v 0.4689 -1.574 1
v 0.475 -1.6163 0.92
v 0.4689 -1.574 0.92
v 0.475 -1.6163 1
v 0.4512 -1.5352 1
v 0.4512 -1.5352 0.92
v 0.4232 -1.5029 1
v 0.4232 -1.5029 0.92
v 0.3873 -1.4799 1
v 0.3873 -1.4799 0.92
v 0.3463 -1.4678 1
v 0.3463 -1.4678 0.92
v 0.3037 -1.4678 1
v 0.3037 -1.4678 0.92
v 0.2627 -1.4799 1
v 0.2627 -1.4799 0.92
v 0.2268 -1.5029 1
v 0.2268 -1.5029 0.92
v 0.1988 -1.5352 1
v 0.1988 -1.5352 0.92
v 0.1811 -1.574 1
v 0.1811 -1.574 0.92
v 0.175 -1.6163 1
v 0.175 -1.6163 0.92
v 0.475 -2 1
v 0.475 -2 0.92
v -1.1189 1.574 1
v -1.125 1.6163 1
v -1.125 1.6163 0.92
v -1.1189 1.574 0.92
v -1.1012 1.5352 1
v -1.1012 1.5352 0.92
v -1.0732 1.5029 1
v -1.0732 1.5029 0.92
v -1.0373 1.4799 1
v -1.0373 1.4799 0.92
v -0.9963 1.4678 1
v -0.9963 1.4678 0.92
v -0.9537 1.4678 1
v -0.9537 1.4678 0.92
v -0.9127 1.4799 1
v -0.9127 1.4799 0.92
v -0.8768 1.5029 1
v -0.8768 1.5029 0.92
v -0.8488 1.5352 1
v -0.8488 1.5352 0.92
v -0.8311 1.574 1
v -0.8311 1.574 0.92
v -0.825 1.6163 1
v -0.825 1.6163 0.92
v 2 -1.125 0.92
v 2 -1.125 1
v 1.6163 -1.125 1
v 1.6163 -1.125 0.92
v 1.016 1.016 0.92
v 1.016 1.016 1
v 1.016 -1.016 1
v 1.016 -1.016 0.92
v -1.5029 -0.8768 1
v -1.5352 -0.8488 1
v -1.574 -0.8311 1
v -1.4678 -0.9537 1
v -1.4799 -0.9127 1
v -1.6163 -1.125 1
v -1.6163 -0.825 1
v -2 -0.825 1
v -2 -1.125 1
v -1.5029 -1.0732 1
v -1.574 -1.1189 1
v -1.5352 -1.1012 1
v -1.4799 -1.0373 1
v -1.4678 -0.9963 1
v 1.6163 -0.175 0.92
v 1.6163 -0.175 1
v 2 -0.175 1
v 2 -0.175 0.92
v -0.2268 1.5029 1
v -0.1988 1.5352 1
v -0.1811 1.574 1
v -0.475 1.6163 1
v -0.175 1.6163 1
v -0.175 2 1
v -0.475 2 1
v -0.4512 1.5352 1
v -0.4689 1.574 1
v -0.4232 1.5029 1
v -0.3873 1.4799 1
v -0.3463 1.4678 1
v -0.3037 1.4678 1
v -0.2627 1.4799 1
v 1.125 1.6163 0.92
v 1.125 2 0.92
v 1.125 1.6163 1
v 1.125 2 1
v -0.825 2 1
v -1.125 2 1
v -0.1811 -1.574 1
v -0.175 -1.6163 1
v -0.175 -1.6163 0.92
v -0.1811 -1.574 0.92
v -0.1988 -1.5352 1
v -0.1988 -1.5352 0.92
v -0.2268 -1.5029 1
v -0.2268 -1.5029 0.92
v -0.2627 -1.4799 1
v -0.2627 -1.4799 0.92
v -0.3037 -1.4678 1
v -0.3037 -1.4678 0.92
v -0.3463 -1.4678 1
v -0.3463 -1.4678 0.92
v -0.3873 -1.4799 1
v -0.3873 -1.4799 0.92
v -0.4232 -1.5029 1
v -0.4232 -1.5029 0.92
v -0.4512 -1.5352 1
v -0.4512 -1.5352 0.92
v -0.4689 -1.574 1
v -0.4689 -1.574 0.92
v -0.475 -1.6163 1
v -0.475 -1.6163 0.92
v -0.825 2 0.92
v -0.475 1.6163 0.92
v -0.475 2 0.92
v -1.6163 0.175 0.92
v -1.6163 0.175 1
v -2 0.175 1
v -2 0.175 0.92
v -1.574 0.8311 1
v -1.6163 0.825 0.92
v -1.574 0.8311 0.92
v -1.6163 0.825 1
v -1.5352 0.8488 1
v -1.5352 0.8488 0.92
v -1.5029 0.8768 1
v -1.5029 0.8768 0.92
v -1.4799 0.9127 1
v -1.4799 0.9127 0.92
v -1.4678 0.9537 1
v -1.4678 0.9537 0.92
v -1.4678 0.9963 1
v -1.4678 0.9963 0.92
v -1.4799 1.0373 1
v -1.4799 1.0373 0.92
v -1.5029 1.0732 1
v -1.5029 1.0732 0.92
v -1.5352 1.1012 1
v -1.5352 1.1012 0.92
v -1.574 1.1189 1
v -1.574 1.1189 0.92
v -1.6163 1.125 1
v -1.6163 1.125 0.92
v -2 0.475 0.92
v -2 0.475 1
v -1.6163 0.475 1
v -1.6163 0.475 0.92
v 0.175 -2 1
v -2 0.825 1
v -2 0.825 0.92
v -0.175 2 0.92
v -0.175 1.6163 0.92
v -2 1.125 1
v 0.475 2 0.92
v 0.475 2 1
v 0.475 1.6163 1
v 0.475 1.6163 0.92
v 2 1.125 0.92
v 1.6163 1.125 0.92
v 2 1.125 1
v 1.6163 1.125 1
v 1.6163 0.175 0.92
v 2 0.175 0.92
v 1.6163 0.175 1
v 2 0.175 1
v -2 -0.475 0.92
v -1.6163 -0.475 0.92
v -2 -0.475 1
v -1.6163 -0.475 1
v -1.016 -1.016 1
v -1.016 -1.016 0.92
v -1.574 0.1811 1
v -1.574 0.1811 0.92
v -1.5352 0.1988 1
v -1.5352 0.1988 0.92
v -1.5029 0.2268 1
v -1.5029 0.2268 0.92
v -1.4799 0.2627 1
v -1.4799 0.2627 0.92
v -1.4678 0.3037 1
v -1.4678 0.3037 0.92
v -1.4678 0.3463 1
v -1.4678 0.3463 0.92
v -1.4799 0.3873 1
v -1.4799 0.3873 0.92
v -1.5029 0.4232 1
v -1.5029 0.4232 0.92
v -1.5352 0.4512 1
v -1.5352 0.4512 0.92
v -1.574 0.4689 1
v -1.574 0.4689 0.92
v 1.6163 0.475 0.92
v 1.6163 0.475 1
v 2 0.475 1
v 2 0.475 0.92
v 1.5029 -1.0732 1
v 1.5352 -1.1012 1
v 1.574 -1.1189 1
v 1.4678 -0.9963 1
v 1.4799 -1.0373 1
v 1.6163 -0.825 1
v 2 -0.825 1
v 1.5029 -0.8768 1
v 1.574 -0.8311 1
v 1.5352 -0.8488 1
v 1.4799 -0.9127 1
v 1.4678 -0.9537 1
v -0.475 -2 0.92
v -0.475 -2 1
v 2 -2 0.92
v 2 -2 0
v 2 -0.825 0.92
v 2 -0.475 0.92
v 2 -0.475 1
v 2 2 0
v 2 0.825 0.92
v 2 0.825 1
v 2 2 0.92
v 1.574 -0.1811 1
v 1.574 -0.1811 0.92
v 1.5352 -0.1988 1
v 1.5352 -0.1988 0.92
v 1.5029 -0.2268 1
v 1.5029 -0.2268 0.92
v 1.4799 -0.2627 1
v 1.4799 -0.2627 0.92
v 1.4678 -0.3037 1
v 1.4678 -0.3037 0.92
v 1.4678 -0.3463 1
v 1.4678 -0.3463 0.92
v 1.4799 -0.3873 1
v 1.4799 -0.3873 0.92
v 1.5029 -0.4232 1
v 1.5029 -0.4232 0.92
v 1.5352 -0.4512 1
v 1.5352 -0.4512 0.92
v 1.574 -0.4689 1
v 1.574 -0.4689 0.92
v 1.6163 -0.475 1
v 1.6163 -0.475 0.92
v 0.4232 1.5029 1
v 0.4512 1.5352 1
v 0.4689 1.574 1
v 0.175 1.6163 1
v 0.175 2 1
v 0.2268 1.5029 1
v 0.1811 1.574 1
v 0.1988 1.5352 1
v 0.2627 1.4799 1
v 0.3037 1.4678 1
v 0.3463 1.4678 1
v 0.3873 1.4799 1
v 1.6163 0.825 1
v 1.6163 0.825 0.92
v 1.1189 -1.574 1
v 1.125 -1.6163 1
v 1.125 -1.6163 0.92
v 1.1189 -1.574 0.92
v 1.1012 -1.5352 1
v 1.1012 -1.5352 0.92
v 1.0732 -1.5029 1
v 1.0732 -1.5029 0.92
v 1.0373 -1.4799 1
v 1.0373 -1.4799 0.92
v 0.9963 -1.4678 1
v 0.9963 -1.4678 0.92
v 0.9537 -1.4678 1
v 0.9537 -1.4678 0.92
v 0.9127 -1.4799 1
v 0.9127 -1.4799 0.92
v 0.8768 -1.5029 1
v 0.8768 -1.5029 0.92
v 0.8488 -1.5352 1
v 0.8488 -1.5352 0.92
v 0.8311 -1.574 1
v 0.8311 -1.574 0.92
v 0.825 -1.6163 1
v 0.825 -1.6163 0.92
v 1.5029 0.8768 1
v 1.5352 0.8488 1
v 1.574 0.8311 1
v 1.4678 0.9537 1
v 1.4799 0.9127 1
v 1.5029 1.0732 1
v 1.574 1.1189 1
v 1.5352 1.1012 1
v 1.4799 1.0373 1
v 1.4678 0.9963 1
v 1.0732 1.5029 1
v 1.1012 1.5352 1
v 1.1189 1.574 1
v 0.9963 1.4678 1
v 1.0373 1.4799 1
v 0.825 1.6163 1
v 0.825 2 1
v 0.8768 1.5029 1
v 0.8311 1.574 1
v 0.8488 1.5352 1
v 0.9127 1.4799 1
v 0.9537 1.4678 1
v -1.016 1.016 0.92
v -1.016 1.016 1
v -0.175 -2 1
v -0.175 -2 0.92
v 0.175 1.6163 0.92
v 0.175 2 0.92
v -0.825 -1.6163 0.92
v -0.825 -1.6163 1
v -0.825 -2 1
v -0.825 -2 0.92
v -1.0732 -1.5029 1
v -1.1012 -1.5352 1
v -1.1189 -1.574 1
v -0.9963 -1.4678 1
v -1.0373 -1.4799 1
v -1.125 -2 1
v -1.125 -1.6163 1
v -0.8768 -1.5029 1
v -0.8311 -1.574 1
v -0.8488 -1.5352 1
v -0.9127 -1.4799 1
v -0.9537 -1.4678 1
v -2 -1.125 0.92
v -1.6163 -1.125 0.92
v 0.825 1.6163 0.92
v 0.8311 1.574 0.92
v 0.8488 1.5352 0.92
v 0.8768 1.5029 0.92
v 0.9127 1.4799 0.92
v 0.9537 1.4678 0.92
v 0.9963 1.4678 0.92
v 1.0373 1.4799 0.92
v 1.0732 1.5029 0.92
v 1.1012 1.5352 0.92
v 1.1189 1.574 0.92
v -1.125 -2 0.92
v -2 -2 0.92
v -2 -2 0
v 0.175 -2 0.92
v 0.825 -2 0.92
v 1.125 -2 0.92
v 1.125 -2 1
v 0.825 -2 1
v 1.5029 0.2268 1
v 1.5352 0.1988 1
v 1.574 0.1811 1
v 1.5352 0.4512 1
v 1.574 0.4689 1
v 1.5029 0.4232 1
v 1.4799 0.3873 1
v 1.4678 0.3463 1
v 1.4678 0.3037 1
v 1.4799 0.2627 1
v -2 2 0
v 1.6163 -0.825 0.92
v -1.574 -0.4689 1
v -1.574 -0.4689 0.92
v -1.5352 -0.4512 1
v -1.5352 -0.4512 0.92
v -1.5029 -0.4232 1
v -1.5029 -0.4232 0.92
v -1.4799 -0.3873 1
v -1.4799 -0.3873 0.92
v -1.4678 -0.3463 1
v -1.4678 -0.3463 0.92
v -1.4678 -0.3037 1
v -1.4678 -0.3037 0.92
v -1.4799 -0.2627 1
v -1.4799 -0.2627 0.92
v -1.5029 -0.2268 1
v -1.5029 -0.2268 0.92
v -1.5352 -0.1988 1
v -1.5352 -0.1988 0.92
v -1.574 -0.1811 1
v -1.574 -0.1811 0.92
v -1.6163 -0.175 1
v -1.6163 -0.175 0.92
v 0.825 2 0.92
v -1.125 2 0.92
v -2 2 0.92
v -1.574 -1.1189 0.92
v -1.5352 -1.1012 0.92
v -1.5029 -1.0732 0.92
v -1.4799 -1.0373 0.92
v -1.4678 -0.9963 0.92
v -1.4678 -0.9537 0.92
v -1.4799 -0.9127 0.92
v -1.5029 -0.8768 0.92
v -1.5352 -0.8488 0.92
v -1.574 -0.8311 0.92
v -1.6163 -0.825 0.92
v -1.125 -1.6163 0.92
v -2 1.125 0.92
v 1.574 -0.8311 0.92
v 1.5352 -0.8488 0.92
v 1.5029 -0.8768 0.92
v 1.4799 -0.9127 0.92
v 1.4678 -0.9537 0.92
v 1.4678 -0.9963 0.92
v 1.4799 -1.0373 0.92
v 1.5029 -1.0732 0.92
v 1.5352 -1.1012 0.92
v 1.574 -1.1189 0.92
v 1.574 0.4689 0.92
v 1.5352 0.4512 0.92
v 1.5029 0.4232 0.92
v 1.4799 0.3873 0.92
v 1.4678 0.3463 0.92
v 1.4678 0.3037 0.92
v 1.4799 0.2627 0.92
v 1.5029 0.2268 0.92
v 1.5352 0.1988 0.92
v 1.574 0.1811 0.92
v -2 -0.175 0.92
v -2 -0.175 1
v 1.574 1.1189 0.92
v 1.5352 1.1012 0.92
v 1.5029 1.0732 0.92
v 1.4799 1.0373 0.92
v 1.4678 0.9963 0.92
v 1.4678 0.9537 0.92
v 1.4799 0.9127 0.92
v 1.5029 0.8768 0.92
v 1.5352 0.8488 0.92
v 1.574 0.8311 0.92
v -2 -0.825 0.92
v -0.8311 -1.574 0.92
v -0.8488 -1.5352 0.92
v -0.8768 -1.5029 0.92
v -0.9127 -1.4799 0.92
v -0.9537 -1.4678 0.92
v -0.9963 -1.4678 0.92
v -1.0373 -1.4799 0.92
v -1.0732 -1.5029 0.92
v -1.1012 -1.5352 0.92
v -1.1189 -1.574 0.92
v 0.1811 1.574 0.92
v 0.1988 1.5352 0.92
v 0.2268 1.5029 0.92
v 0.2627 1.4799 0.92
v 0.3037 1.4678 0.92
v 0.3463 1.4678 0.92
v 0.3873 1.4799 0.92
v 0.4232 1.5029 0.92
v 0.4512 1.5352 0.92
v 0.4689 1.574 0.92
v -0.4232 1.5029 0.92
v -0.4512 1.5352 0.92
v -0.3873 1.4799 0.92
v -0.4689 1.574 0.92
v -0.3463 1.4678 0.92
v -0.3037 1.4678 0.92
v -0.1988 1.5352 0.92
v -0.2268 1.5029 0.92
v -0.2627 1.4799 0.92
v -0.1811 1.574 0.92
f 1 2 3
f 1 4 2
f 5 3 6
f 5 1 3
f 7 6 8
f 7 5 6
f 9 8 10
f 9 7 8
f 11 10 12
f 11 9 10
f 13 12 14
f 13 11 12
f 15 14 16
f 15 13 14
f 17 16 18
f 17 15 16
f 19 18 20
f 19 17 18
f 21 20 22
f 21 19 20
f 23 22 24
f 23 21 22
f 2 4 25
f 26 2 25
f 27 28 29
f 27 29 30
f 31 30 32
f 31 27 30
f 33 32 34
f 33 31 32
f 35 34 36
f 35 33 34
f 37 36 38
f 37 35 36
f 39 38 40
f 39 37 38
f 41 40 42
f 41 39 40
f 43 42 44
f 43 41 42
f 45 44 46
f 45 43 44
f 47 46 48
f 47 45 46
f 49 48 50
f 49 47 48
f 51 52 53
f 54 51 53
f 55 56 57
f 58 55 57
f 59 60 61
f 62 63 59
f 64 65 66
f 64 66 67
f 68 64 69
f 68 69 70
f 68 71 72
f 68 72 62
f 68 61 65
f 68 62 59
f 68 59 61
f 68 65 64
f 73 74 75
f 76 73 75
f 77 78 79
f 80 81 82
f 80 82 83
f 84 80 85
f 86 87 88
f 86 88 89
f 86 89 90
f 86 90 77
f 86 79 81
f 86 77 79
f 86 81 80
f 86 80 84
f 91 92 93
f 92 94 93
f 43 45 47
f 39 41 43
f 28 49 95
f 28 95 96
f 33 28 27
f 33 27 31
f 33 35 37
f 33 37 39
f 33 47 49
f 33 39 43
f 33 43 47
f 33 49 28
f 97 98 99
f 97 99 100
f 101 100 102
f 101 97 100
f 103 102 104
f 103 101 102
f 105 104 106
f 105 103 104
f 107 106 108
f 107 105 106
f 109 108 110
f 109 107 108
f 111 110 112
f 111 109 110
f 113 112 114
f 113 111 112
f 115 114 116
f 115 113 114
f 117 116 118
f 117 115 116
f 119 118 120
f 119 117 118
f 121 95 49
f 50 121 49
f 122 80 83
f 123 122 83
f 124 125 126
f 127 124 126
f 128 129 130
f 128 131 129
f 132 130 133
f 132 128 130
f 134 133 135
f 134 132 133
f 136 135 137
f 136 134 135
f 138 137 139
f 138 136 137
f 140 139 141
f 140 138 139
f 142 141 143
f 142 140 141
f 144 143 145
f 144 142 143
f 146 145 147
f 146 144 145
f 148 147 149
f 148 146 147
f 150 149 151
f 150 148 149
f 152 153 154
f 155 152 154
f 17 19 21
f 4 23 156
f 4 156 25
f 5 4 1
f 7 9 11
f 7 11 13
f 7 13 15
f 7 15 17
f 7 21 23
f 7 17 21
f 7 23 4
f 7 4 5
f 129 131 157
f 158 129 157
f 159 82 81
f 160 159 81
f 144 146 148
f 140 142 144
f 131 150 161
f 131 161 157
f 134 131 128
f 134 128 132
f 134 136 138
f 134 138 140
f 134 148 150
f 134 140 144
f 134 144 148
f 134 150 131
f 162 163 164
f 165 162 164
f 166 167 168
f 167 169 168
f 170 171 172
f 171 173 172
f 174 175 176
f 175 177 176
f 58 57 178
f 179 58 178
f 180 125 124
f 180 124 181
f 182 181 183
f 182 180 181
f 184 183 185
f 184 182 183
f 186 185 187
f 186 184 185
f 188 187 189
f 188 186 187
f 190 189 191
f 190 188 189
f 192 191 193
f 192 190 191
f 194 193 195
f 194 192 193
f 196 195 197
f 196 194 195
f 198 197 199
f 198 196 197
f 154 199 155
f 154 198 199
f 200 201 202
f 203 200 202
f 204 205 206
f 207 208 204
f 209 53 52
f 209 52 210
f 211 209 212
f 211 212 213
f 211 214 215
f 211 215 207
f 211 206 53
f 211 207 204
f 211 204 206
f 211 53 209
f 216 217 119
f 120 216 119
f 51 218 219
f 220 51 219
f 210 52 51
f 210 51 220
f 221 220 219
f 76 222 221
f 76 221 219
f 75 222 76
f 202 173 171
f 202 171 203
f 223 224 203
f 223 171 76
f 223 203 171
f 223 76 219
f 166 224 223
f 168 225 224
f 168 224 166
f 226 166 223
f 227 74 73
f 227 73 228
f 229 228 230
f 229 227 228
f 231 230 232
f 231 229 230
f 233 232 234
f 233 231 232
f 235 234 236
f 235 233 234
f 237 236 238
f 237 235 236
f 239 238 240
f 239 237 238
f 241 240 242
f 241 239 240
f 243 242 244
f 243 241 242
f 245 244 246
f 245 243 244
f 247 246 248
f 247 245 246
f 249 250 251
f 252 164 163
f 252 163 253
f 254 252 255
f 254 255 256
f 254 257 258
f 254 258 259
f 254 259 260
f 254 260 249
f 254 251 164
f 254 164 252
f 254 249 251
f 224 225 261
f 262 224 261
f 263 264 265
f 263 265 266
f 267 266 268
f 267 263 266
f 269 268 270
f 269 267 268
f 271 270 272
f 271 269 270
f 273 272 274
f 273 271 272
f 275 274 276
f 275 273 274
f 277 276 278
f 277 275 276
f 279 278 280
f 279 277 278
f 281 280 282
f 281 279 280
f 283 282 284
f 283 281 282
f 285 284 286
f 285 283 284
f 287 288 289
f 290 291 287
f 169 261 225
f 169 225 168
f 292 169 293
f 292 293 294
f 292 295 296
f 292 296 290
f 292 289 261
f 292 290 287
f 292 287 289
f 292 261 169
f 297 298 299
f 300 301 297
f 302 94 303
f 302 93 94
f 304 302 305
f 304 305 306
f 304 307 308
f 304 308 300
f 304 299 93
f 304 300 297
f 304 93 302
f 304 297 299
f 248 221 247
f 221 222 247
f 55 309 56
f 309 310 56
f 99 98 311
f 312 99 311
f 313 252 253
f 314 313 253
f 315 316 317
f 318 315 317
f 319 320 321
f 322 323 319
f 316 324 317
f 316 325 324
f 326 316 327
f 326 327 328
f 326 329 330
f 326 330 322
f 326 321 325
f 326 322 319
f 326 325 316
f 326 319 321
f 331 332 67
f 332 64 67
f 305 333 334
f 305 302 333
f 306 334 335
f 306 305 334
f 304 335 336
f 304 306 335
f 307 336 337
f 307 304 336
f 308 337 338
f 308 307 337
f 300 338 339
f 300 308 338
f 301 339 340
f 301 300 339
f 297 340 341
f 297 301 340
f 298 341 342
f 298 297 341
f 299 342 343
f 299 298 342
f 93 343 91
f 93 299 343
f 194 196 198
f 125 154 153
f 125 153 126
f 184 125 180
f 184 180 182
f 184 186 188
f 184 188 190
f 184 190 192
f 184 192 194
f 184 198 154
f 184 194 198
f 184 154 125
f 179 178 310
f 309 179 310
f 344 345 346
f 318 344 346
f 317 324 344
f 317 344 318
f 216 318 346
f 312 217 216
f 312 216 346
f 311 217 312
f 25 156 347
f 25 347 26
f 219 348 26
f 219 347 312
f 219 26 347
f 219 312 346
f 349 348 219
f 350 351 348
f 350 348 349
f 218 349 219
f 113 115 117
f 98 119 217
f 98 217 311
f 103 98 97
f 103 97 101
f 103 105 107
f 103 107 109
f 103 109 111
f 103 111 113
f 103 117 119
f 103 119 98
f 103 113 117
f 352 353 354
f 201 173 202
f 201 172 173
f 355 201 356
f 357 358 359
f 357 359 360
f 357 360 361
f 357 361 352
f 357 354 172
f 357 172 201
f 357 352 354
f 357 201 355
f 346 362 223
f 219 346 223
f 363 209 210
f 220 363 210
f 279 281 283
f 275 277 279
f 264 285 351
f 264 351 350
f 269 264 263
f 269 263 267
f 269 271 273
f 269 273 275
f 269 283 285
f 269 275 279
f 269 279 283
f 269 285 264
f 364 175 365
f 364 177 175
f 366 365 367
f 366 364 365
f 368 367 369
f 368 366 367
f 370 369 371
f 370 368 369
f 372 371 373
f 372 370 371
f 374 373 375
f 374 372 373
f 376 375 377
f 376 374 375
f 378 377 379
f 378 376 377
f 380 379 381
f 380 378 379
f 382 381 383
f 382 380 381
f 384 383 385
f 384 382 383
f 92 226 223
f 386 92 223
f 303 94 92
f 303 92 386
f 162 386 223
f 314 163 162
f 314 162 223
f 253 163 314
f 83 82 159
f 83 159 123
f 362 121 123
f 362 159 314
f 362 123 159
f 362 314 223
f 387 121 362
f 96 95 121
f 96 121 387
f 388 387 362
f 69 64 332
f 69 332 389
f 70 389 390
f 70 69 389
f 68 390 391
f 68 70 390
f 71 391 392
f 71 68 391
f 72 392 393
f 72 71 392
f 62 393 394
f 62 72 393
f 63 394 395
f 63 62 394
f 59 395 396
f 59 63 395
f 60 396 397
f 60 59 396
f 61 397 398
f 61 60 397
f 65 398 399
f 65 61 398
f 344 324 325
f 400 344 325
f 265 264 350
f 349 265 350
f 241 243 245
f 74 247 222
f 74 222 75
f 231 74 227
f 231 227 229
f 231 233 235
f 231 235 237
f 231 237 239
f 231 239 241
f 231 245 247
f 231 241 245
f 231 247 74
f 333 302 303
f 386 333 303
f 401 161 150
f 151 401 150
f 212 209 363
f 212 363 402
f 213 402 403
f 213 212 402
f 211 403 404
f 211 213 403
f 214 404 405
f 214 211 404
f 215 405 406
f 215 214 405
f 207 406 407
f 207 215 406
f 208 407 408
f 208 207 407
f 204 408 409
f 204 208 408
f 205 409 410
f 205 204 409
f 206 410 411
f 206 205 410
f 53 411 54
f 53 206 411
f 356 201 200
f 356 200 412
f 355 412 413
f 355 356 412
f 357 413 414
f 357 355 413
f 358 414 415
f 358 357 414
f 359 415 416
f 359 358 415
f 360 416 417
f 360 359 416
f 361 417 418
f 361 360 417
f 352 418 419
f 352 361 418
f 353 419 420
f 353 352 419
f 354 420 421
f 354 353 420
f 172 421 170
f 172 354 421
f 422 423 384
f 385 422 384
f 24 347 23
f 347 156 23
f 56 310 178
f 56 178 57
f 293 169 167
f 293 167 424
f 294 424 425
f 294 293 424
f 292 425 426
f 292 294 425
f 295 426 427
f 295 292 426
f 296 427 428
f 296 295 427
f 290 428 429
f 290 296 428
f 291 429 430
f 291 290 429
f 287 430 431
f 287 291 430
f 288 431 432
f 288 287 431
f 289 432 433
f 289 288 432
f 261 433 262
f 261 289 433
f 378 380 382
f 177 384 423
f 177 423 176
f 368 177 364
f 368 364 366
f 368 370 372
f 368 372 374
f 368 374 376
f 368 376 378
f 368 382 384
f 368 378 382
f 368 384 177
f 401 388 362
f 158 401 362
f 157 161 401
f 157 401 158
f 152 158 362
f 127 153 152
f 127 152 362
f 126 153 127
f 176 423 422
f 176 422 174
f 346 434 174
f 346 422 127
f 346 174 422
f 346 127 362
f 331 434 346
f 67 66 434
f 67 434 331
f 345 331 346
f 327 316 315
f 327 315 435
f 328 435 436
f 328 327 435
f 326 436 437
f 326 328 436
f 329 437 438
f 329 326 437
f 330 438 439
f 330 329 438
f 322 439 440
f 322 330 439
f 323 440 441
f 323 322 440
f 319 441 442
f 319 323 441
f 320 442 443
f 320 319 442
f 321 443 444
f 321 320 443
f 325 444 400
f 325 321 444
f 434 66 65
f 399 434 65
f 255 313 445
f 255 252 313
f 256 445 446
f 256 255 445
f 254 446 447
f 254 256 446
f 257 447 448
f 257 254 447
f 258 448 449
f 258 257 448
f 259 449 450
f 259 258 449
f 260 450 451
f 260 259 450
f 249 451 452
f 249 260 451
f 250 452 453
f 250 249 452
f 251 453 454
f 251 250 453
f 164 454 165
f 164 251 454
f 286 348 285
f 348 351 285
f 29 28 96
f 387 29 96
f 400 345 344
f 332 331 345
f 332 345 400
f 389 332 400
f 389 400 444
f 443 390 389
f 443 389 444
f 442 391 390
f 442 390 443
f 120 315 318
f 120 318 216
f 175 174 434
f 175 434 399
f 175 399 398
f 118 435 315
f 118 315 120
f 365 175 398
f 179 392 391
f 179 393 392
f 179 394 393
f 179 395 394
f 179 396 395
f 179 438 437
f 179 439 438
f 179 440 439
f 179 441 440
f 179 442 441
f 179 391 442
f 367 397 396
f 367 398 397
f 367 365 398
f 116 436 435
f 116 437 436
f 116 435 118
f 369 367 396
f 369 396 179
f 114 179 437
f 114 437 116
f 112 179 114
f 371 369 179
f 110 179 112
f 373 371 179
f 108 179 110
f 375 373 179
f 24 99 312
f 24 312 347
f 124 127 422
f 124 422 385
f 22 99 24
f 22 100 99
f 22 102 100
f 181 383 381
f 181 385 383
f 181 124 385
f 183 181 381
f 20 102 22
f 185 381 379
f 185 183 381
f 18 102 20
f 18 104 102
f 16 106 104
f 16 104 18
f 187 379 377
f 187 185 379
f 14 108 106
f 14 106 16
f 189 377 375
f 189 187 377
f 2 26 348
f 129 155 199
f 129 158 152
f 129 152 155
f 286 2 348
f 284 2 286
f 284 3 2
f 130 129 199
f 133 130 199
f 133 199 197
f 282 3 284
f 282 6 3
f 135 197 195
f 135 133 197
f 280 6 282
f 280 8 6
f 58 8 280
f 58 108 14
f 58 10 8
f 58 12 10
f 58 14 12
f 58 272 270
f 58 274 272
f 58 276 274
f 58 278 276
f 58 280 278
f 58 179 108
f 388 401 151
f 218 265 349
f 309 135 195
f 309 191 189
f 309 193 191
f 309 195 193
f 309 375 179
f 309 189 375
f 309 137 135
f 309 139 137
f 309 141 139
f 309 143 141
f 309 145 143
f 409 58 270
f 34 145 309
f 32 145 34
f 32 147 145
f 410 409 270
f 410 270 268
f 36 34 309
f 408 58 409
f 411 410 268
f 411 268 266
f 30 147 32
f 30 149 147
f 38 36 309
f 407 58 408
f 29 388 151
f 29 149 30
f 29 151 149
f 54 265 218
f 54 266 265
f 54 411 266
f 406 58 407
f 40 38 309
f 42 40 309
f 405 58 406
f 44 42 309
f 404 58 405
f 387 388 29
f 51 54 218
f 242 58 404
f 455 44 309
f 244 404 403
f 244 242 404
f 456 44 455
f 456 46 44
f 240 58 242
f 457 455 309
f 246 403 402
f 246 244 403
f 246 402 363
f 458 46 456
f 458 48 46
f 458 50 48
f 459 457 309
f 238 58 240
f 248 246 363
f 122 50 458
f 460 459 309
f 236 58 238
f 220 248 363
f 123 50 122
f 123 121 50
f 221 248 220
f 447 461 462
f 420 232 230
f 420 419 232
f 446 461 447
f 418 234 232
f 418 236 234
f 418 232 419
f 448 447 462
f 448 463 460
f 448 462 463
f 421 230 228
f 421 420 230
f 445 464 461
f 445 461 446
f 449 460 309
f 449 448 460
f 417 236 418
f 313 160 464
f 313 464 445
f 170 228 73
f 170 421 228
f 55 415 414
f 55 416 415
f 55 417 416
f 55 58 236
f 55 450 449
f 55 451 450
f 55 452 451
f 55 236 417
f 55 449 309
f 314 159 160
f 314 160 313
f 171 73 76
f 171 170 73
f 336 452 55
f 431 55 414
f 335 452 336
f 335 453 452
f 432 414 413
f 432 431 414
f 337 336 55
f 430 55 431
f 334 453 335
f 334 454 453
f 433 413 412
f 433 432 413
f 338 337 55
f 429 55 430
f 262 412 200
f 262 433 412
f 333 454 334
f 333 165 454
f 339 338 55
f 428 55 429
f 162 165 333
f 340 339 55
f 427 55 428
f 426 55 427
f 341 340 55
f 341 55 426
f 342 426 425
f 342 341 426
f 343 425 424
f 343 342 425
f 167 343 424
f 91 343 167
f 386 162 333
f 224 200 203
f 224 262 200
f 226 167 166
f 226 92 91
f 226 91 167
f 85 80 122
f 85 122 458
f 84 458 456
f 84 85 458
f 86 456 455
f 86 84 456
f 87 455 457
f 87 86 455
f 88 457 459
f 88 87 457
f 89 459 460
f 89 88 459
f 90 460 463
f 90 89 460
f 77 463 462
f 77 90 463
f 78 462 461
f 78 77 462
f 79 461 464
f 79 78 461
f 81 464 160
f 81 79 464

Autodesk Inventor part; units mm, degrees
ref_plane "YZ Plane" through (0, 0, 0) normal (1, 0, 0) x (0, 1, 0)
ref_plane "XZ Plane" through (0, 0, 0) normal (0, 1, 0) x (-1, 0, 0)
ref_plane "XY Plane" through (0, 0, 0) normal (0, 0, 1) x (1, 0, 0)
sketch "Sketch1" plane through (0, 0, 0) normal (0, 0, 1) x (1, 0, 0)
  line L0 (-2, 2) -> (2, 2)
  line L1 (2, 2) -> (2, -2)
  line L2 (2, -2) -> (-2, -2)
  line L3 (-2, -2) -> (-2, 2)
  point P0 (0, 0)
  dimension "d0" = 4
  dimension "d1" = 4
  dimension "d22" = 2
  dimension "d23" = 2
extrude "Extrusion1" add sketch "Sketch1" along normal blind 0.92
ref_plane "Work Plane1" through (0, 0, 1) normal (0, 0, 1) x (1, 0, 0)
sketch "Sketch2" plane through (0, 0, 1) normal (0, 0, 1) x (1, 0, 0)
  line L0 (2, 2) -> (-2, 2) projected
  line L1 (-2, 2) -> (-2, -2) projected
  line L2 (-2, -2) -> (2, -2) projected
  line L3 (2, -2) -> (2, 2) projected
  line L4 (-1.125, -2) -> (-1.125, -1.6163)
  line L5 (-0.825, -1.6163) -> (-0.825, -2)
  arc A0 (-0.825, -1.6163) -> (-1.125, -1.6163) centre (-0.975, -1.6163) ccw
  line L6 (-0.475, -2) -> (-0.475, -1.6163)
  line L7 (-0.175, -1.6163) -> (-0.175, -2)
  arc A1 (-0.175, -1.6163) -> (-0.475, -1.6163) centre (-0.325, -1.6163) ccw
  line L8 (0.175, -2) -> (0.175, -1.6163)
  line L9 (0.475, -1.6163) -> (0.475, -2)
  arc A2 (0.475, -1.6163) -> (0.175, -1.6163) centre (0.325, -1.6163) ccw
  line L10 (0.825, -2) -> (0.825, -1.6163)
  line L11 (1.125, -1.6163) -> (1.125, -2)
  arc A3 (1.125, -1.6163) -> (0.825, -1.6163) centre (0.975, -1.6163) ccw
  line L12 (0, 0) -> (0, -2.7079) construction
  dimension "d7" = 0.3837
  dimension "d8" = 0.3
  dimension "d11" = 0.65
  dimension "d16" = 0.325
extrude "Extrusion2" add sketch "Sketch2" against normal blind 0.2 contours L4 A0 L5 L2
pattern_linear "Rectangular Pattern1" count 4 spacing 0.65 along (1, 0, 0) of "Extrusion2"
pattern_circular "Circular Pattern1" count 4 over 360 about axis through (0, 0, -10) along (0, 0, 1) of "Extrusion2", "Rectangular Pattern1"
sketch "Sketch3" plane through (0, 0, 1) normal (0, 0, 1) x (1, 0, 0)
  line L0 (-1.016, 1.016) -> (1.016, 1.016)
  line L1 (1.016, 1.016) -> (1.016, -1.016)
  line L2 (1.016, -1.016) -> (-1.016, -1.016)
  line L3 (-1.016, -1.016) -> (-1.016, 1.016)
  point P0 (0, 0)
  dimension "d27" = 2.032
  dimension "d28" = 2.032
  dimension "d29" = 1.016
  dimension "d30" = 1.016
extrude "Extrusion3" add sketch "Sketch3" against normal blind 0.2
equation "\"d22\" = 0.5 * d0"
equation "\"d23\" = 0.5 * d1"
equation "\"d29\" = 0.5 * d27"
equation "\"d30\" = 0.5 * d28"
properties part number "QFN16_4mmx4mm" material "Phenolic Resin"
